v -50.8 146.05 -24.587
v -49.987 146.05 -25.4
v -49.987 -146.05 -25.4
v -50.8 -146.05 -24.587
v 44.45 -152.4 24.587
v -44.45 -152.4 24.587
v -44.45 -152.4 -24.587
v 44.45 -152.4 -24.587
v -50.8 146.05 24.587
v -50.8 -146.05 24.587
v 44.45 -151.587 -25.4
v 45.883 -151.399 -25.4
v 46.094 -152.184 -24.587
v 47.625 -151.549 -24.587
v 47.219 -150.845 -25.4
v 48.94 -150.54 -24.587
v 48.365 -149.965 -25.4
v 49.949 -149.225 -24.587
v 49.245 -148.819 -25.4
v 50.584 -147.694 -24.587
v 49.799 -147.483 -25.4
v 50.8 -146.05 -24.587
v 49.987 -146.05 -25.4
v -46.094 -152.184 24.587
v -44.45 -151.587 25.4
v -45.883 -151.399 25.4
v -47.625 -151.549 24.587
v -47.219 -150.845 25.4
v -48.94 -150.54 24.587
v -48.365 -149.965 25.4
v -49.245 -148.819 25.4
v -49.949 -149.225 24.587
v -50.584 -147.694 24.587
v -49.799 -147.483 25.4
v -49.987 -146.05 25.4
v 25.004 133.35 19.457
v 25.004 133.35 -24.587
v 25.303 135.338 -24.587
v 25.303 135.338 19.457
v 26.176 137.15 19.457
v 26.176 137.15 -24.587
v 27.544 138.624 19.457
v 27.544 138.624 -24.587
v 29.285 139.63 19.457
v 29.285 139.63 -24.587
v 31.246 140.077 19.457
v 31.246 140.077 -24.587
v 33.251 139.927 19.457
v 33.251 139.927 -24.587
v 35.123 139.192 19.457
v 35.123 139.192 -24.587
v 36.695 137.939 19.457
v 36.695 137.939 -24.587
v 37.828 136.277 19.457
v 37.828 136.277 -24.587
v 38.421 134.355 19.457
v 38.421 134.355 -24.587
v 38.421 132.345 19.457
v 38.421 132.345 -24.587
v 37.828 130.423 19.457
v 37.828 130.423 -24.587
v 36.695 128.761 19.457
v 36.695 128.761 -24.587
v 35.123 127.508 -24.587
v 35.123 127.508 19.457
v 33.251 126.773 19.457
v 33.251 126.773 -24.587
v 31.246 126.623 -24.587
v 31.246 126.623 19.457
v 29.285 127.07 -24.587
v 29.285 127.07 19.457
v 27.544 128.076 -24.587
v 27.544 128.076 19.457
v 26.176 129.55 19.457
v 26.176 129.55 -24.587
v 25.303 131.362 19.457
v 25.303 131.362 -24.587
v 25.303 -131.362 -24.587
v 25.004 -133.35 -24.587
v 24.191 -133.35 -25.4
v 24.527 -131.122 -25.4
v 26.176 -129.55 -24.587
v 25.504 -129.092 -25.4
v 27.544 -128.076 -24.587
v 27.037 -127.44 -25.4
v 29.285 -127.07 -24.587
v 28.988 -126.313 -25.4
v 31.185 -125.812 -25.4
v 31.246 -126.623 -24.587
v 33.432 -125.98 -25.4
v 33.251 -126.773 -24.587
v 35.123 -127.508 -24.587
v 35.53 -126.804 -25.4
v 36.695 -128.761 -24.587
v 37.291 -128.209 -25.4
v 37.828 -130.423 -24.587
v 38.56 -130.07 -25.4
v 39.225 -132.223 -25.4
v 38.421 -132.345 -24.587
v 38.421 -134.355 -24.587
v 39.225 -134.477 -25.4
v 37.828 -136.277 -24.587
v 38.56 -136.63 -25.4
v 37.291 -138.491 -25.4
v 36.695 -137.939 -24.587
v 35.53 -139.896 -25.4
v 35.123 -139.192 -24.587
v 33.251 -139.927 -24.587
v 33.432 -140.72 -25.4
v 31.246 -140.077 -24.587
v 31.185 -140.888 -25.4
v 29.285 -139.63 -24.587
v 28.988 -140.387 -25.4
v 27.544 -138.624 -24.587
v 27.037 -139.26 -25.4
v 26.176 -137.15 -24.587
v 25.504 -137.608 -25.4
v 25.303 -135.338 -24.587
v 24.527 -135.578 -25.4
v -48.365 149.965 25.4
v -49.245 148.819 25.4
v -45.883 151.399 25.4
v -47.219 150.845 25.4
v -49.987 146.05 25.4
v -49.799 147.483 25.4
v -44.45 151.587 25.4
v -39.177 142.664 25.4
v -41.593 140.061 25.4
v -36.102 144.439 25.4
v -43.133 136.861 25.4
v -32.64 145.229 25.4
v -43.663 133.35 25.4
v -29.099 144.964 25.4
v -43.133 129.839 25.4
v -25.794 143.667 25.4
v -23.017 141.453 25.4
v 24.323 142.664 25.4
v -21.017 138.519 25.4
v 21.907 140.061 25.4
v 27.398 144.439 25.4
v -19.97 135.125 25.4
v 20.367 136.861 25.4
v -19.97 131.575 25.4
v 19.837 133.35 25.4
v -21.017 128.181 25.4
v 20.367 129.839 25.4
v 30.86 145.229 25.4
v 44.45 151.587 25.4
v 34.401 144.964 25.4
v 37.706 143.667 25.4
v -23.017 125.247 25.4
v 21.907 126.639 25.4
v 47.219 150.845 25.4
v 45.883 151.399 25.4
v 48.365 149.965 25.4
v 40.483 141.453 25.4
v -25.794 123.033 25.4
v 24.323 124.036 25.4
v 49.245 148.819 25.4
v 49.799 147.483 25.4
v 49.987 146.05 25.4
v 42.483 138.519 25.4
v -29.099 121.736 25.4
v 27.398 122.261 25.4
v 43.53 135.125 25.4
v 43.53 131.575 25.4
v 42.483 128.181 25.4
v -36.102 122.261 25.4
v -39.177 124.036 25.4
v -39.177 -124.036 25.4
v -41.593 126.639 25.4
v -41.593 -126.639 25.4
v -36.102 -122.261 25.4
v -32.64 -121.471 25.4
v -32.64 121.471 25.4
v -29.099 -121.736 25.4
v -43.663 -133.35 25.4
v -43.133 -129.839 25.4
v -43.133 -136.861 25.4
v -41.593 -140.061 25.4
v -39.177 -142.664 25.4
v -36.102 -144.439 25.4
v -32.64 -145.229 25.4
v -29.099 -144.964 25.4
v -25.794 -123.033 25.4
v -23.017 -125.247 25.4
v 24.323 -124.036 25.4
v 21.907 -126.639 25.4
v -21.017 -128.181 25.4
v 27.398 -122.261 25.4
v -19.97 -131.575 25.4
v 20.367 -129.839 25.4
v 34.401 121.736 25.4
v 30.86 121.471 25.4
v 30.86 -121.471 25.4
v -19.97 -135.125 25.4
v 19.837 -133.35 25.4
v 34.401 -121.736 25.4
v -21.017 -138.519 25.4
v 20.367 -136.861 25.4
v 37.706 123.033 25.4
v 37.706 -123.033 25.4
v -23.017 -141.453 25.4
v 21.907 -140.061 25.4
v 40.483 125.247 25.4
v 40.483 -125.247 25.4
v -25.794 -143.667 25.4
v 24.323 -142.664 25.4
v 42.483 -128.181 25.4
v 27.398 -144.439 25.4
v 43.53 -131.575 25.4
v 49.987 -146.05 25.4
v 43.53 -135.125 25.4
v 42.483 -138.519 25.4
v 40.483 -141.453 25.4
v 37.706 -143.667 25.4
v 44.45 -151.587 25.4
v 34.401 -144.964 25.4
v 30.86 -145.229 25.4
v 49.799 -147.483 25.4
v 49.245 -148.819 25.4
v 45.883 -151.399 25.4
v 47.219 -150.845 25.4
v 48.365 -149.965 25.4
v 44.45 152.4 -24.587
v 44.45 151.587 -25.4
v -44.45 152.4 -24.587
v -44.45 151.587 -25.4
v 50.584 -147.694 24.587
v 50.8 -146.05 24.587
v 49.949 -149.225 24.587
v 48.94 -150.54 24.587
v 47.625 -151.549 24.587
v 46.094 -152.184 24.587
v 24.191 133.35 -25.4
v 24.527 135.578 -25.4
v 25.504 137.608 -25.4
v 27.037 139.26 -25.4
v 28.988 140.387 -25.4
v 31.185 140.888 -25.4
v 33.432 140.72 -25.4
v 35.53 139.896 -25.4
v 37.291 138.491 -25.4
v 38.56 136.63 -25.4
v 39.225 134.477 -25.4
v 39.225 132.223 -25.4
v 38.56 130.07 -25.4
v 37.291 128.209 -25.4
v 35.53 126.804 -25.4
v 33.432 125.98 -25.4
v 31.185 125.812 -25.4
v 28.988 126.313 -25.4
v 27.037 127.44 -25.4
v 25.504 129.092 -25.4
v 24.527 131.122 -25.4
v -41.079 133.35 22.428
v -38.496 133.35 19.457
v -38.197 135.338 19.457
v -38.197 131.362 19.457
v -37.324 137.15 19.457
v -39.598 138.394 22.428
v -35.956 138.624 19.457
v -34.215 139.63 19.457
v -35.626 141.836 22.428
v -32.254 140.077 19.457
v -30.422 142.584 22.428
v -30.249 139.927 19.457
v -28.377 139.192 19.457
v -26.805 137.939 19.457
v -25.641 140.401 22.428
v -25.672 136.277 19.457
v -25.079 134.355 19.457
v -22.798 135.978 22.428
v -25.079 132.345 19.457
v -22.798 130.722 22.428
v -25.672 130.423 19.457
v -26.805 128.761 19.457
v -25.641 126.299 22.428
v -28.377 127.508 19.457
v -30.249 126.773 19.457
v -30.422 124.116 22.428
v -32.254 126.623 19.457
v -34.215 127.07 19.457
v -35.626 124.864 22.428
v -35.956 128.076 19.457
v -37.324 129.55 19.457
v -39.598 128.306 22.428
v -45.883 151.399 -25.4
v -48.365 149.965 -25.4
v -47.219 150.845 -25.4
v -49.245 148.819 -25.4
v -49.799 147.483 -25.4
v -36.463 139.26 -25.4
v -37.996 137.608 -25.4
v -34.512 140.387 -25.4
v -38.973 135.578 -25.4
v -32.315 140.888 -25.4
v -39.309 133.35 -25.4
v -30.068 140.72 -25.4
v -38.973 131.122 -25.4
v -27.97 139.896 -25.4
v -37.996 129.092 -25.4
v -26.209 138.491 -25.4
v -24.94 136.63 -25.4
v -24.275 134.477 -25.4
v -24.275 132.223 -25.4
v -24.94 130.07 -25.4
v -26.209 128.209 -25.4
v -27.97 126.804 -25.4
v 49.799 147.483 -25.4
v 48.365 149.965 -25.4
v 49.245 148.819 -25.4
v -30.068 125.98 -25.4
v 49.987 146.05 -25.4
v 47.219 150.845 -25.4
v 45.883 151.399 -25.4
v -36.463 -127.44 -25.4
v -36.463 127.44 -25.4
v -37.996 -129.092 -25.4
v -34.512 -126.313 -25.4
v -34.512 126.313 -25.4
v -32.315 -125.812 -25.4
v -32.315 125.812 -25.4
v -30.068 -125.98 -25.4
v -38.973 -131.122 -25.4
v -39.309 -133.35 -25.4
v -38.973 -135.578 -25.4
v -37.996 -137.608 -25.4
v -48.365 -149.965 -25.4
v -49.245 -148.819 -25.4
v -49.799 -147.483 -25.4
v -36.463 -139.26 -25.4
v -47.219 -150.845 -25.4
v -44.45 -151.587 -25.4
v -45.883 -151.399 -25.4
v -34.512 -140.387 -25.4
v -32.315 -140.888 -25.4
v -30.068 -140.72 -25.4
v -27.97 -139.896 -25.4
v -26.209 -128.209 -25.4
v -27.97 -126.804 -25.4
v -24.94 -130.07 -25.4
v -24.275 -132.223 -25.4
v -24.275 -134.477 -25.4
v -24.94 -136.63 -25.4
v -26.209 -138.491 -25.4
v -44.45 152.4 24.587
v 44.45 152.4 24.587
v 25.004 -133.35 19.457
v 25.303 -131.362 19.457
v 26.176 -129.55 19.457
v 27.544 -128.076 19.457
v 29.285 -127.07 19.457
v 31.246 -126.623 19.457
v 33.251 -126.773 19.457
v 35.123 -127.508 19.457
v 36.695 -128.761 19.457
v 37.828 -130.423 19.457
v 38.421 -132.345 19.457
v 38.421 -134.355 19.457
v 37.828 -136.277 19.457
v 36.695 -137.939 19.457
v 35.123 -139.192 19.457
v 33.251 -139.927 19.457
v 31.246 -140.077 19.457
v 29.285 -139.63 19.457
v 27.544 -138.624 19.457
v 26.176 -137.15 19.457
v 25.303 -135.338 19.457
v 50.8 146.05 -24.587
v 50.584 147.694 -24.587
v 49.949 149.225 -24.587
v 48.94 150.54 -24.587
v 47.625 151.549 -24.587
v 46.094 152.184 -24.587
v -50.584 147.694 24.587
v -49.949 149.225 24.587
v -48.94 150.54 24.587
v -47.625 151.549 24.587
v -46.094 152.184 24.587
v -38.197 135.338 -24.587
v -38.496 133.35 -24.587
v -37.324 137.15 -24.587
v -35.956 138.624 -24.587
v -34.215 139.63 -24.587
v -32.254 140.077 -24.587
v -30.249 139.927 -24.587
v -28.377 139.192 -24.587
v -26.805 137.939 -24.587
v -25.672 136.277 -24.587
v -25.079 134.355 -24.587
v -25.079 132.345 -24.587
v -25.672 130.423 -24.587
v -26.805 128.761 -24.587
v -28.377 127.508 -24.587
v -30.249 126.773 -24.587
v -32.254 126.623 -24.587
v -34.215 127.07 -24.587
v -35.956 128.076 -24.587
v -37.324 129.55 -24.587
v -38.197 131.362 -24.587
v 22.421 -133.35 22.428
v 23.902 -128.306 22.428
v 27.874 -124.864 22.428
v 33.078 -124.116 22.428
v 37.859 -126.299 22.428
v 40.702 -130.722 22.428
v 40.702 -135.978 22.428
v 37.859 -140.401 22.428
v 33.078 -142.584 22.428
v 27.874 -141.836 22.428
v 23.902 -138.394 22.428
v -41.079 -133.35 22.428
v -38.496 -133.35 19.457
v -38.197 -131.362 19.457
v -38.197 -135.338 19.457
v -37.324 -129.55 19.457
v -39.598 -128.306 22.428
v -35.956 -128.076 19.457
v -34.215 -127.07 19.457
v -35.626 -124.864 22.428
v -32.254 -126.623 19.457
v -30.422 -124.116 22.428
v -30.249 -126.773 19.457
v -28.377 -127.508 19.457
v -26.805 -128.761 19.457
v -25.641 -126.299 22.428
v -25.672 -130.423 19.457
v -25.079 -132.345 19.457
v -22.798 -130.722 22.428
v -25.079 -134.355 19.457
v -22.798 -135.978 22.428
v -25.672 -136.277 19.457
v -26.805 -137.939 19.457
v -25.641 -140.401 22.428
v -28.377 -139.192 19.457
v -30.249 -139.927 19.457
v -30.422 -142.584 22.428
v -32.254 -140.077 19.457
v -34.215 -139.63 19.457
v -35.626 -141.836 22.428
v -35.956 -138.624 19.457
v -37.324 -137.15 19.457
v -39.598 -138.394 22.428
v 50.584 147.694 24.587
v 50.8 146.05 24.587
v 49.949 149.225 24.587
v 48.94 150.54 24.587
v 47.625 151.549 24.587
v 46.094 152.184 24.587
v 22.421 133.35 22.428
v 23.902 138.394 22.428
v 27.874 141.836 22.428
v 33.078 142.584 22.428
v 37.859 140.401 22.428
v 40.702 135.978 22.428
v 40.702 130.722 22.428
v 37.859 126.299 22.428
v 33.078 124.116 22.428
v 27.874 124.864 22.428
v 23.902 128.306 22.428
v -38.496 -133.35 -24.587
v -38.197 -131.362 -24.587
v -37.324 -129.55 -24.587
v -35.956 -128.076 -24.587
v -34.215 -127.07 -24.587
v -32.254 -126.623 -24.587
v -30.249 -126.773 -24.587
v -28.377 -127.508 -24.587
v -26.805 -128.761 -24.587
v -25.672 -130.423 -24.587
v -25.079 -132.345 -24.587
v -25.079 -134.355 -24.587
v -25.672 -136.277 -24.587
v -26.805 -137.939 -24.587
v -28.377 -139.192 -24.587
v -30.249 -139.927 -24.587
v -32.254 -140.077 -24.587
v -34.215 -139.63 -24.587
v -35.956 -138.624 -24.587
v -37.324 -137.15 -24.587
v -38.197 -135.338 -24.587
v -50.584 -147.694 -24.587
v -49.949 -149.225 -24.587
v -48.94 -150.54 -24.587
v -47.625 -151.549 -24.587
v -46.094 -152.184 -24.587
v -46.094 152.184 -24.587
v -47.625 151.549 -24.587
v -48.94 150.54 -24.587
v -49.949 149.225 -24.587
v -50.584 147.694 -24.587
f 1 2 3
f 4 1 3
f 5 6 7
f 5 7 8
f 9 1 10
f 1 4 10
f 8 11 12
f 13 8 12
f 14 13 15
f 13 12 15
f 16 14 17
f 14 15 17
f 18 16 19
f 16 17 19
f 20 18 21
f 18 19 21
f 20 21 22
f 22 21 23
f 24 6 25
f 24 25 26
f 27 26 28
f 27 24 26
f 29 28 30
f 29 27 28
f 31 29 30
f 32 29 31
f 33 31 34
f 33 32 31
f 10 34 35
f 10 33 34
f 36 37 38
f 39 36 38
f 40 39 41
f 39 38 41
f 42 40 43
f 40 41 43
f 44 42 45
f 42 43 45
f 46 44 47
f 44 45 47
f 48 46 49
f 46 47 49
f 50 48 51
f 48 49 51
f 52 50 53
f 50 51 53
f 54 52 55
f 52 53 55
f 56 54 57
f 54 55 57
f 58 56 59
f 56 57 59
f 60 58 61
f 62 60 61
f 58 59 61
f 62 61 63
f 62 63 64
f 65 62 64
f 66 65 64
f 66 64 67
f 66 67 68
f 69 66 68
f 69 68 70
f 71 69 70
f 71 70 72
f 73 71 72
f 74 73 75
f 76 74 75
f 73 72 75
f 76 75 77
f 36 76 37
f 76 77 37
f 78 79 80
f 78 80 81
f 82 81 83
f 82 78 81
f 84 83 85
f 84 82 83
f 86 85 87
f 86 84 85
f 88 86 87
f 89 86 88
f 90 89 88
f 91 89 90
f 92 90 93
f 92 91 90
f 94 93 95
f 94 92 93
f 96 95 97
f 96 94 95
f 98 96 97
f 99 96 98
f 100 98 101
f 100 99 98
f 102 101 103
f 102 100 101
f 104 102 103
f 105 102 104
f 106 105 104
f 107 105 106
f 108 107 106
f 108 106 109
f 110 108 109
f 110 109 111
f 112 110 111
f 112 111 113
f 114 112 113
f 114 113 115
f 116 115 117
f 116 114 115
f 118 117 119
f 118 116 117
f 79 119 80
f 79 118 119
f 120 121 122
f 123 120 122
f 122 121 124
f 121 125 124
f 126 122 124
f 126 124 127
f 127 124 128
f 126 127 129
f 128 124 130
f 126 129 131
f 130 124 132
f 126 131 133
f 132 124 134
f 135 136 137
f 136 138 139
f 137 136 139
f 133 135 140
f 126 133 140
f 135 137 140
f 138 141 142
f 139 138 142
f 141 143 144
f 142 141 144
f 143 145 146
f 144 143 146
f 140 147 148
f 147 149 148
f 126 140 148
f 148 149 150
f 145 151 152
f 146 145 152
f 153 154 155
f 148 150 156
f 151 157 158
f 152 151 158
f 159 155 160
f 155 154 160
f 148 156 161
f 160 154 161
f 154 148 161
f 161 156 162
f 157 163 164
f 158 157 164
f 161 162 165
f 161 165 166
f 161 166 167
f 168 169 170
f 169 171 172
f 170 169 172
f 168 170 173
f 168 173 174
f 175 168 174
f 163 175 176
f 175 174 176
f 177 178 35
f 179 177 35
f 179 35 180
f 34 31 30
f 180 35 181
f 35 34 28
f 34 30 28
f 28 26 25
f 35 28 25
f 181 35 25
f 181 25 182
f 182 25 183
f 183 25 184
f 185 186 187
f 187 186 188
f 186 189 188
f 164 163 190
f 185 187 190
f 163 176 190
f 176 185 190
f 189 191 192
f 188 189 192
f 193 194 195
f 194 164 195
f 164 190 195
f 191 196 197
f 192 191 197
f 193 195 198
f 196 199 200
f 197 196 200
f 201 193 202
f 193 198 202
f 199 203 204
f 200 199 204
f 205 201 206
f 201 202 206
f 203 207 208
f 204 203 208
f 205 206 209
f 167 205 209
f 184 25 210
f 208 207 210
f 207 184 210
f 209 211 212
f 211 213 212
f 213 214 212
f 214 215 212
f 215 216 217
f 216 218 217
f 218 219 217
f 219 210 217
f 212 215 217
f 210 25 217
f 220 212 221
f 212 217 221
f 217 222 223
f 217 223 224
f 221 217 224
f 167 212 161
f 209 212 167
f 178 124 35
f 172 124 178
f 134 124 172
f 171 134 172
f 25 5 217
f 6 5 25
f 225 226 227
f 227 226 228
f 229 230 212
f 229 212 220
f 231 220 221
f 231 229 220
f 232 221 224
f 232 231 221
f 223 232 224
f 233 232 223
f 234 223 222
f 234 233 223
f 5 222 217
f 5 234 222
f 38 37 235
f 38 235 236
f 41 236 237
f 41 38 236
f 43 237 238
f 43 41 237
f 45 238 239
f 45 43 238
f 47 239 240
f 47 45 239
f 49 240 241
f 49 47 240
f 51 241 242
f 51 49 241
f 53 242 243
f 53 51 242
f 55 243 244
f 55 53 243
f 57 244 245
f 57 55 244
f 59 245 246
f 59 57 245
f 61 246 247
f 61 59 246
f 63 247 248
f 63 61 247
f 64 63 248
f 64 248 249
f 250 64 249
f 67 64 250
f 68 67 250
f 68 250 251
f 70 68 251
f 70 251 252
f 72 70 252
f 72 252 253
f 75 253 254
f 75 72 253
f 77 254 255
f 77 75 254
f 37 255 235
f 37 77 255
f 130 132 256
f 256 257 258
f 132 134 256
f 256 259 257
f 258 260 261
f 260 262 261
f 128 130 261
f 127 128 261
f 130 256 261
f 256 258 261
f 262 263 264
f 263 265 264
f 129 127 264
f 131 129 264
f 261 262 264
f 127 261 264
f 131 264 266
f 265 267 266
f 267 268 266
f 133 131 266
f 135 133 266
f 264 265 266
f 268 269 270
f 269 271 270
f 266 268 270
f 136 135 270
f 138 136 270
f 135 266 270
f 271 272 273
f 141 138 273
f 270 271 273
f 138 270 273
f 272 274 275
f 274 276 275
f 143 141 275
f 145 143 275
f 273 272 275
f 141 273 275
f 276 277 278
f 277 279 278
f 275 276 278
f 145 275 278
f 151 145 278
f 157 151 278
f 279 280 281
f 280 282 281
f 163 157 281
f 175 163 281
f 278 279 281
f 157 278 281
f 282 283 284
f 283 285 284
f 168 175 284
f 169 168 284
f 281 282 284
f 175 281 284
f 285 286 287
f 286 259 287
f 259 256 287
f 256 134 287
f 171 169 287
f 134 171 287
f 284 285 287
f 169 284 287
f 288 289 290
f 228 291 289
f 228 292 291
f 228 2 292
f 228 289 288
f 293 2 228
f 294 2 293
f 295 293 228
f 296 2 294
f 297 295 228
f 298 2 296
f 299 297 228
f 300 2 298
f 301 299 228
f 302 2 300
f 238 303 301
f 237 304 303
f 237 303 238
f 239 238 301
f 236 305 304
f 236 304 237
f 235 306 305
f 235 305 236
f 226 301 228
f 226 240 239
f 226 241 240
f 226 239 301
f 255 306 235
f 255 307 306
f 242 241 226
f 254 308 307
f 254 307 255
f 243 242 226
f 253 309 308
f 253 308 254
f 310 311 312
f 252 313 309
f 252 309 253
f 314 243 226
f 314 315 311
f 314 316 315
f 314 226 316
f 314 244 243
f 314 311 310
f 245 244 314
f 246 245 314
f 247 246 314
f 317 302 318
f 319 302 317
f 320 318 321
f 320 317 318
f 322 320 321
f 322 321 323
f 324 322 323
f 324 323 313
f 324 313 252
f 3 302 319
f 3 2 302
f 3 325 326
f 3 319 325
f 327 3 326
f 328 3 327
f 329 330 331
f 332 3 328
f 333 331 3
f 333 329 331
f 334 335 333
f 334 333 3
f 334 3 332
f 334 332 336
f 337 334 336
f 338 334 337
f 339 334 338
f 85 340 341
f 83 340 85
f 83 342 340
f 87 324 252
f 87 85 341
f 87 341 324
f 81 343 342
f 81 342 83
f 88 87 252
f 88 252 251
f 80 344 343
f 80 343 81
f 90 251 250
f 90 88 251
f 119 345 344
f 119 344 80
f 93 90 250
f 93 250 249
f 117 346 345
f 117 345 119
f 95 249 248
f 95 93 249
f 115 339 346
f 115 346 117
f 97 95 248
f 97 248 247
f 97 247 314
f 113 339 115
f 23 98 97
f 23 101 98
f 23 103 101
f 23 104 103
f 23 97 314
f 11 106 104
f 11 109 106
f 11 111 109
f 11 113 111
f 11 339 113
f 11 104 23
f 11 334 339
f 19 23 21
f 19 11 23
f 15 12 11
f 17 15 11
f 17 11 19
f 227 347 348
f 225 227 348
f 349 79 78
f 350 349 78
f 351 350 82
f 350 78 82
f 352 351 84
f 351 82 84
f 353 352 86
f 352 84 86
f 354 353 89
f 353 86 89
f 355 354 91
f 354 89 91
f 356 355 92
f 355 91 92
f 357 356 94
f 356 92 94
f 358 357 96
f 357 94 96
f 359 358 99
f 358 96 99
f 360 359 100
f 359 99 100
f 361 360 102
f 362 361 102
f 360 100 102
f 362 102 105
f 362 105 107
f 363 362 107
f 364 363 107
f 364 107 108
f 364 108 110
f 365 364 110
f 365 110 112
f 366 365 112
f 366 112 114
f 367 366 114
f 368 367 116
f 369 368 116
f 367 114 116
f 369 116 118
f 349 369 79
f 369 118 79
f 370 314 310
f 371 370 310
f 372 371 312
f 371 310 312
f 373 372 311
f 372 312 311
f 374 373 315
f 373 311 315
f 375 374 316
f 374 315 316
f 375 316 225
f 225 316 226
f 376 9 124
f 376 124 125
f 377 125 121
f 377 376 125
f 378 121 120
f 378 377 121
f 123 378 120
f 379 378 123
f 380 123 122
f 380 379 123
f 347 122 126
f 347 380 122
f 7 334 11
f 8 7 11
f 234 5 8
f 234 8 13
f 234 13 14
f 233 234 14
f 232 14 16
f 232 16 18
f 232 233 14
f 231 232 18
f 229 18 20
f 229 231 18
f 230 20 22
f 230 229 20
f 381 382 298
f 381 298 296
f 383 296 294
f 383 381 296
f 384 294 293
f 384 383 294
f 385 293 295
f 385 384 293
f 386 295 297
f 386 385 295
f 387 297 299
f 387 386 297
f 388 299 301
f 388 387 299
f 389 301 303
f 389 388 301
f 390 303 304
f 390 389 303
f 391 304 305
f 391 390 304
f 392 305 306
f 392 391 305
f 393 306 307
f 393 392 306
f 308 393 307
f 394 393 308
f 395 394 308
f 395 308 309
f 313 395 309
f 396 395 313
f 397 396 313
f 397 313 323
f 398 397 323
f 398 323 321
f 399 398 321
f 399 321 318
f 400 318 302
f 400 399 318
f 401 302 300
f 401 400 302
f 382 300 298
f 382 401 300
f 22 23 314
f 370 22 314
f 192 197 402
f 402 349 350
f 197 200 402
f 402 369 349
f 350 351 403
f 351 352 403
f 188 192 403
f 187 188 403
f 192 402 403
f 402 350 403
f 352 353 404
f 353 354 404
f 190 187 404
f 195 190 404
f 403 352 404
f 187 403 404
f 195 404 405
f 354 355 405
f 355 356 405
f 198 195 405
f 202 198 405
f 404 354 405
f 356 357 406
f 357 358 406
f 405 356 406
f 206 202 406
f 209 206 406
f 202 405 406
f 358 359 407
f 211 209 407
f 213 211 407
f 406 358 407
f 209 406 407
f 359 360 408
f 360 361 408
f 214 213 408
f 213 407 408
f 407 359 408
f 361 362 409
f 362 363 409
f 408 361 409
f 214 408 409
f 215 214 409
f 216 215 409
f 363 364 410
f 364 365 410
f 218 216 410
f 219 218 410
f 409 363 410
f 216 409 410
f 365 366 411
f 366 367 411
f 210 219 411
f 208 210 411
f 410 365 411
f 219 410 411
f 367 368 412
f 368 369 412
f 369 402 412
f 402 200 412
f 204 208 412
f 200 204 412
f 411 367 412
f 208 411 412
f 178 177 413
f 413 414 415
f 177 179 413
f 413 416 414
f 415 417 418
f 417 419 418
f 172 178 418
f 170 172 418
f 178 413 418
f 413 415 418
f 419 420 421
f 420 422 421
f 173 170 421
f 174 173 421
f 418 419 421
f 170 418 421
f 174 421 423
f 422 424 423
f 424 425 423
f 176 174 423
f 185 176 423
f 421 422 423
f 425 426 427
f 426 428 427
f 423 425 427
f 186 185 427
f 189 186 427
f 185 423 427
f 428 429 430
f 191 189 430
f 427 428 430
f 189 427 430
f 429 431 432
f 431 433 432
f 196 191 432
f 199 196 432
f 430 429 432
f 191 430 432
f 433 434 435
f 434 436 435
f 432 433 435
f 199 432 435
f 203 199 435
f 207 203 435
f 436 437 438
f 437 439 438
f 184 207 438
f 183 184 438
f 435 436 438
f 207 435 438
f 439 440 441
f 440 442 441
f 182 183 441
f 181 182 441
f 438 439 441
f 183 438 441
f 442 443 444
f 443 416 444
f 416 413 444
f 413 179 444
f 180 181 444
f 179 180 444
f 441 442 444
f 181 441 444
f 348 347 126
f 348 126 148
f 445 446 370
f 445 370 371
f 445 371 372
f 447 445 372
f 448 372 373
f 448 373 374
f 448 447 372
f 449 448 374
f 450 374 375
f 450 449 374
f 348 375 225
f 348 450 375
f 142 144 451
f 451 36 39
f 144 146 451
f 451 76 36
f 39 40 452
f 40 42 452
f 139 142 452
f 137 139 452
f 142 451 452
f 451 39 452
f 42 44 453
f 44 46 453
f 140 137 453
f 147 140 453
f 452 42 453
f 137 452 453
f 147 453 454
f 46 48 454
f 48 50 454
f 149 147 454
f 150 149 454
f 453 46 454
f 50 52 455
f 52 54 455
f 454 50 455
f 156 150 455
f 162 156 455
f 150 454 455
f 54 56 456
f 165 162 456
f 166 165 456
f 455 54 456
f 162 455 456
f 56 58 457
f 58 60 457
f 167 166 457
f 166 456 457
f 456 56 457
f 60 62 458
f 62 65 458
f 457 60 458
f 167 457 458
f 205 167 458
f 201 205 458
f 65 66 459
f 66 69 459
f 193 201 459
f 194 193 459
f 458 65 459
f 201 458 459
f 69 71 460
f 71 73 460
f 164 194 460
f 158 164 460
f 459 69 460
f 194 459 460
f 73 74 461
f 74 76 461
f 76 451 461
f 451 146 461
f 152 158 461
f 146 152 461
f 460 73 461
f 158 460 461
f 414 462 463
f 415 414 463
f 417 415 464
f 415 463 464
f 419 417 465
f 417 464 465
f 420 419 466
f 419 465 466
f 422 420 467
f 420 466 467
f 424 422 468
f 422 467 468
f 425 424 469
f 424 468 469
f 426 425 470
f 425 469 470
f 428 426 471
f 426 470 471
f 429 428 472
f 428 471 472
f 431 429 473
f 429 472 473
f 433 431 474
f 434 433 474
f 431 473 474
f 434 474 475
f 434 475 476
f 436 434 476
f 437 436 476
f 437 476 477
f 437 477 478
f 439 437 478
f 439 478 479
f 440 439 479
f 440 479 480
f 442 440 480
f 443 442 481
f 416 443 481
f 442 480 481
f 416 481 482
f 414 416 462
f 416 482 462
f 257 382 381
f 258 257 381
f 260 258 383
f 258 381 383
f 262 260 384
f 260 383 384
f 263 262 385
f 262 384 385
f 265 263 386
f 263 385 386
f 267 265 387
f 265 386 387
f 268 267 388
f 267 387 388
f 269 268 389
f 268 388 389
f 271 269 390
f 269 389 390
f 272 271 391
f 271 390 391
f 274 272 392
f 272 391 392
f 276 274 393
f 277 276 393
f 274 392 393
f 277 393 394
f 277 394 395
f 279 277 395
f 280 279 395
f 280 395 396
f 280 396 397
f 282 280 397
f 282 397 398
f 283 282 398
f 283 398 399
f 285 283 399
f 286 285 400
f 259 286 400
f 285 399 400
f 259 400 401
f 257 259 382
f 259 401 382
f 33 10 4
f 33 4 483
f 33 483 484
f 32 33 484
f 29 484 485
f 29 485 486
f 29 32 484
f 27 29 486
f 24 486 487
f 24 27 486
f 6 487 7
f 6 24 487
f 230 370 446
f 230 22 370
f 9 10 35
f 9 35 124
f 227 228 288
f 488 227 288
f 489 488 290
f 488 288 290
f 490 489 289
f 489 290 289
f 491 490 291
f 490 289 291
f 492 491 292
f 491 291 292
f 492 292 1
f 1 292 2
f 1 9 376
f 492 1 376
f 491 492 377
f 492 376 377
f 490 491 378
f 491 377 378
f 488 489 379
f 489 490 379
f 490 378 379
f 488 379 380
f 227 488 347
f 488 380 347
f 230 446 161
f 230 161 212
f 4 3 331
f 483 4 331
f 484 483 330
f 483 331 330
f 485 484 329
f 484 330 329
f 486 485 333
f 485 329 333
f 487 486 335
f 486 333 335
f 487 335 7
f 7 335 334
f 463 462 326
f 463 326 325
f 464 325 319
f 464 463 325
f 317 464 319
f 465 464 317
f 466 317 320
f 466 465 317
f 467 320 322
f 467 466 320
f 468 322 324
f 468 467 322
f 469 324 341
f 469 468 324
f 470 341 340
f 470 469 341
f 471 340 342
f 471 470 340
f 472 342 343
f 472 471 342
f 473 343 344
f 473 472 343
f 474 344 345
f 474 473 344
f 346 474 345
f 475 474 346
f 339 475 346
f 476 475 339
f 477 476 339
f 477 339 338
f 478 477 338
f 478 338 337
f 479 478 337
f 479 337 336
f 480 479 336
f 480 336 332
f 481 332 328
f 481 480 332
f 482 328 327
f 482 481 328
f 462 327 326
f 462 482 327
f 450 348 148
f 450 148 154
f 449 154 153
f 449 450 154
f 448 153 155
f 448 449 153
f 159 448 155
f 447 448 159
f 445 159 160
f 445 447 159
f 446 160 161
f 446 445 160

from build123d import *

# Parameters (mm, degrees)
F0_W           = 101.6
F0_H           = 50.8
F1_DEPTH       = 152.4
F3_D           = 13.49248
F3_CSINK_D     = 23.8252
F3_CSINK_ANGLE = 82
F4_R           = 6.35
F5_SIZE        = 0.8128


with BuildPart() as f1:
    # F0 (on Front) → F1 (new body, symmetric)
    with BuildSketch(Plane.XZ):
        Rectangle(F0_W, F0_H)
    extrude(amount=F1_DEPTH, both=True)

    # F3 (through all)
    with Locations(Plane.XY.offset(25.4)):
        with Locations((-31.75, 133.35), (31.75, 133.35), (31.75, -133.35), (-31.75, -133.35)):
            CounterSinkHole(F3_D / 2, F3_CSINK_D / 2, counter_sink_angle=F3_CSINK_ANGLE)

    # F4
    f4_edges = [f1.edges().sort_by_distance(p)[0] for p in [
        (50.8, -152.4, 0),
        (50.8, 152.4, 0),
        (-50.8, -152.4, 0),
        (-50.8, 152.4, 0),
    ]]
    fillet(f4_edges, radius=F4_R)

    # F5
    f5_edges = [f1.edges().sort_by_distance(p)[0] for p in [
        (0, 152.4, 25.4),
        (50.8, 0, 25.4),
        (0, -152.4, 25.4),
        (-50.8, 0, 25.4),
        (-50.8, 0, -25.4),
        (-48.940128, 150.540128, -25.4),
        (-48.940128, -150.540128, -25.4),
        (0, 152.4, -25.4),
        (0, -152.4, -25.4),
        (48.940128, 150.540128, -25.4),
        (48.940128, -150.540128, -25.4),
        (50.8, 0, -25.4),
        (-38.49624, 133.35, -25.4),
        (25.00376, 133.35, -25.4),
        (-38.49624, -133.35, -25.4),
        (25.00376, -133.35, -25.4),
    ]]
    chamfer(f5_edges, length=F5_SIZE)


solid = f1.part
